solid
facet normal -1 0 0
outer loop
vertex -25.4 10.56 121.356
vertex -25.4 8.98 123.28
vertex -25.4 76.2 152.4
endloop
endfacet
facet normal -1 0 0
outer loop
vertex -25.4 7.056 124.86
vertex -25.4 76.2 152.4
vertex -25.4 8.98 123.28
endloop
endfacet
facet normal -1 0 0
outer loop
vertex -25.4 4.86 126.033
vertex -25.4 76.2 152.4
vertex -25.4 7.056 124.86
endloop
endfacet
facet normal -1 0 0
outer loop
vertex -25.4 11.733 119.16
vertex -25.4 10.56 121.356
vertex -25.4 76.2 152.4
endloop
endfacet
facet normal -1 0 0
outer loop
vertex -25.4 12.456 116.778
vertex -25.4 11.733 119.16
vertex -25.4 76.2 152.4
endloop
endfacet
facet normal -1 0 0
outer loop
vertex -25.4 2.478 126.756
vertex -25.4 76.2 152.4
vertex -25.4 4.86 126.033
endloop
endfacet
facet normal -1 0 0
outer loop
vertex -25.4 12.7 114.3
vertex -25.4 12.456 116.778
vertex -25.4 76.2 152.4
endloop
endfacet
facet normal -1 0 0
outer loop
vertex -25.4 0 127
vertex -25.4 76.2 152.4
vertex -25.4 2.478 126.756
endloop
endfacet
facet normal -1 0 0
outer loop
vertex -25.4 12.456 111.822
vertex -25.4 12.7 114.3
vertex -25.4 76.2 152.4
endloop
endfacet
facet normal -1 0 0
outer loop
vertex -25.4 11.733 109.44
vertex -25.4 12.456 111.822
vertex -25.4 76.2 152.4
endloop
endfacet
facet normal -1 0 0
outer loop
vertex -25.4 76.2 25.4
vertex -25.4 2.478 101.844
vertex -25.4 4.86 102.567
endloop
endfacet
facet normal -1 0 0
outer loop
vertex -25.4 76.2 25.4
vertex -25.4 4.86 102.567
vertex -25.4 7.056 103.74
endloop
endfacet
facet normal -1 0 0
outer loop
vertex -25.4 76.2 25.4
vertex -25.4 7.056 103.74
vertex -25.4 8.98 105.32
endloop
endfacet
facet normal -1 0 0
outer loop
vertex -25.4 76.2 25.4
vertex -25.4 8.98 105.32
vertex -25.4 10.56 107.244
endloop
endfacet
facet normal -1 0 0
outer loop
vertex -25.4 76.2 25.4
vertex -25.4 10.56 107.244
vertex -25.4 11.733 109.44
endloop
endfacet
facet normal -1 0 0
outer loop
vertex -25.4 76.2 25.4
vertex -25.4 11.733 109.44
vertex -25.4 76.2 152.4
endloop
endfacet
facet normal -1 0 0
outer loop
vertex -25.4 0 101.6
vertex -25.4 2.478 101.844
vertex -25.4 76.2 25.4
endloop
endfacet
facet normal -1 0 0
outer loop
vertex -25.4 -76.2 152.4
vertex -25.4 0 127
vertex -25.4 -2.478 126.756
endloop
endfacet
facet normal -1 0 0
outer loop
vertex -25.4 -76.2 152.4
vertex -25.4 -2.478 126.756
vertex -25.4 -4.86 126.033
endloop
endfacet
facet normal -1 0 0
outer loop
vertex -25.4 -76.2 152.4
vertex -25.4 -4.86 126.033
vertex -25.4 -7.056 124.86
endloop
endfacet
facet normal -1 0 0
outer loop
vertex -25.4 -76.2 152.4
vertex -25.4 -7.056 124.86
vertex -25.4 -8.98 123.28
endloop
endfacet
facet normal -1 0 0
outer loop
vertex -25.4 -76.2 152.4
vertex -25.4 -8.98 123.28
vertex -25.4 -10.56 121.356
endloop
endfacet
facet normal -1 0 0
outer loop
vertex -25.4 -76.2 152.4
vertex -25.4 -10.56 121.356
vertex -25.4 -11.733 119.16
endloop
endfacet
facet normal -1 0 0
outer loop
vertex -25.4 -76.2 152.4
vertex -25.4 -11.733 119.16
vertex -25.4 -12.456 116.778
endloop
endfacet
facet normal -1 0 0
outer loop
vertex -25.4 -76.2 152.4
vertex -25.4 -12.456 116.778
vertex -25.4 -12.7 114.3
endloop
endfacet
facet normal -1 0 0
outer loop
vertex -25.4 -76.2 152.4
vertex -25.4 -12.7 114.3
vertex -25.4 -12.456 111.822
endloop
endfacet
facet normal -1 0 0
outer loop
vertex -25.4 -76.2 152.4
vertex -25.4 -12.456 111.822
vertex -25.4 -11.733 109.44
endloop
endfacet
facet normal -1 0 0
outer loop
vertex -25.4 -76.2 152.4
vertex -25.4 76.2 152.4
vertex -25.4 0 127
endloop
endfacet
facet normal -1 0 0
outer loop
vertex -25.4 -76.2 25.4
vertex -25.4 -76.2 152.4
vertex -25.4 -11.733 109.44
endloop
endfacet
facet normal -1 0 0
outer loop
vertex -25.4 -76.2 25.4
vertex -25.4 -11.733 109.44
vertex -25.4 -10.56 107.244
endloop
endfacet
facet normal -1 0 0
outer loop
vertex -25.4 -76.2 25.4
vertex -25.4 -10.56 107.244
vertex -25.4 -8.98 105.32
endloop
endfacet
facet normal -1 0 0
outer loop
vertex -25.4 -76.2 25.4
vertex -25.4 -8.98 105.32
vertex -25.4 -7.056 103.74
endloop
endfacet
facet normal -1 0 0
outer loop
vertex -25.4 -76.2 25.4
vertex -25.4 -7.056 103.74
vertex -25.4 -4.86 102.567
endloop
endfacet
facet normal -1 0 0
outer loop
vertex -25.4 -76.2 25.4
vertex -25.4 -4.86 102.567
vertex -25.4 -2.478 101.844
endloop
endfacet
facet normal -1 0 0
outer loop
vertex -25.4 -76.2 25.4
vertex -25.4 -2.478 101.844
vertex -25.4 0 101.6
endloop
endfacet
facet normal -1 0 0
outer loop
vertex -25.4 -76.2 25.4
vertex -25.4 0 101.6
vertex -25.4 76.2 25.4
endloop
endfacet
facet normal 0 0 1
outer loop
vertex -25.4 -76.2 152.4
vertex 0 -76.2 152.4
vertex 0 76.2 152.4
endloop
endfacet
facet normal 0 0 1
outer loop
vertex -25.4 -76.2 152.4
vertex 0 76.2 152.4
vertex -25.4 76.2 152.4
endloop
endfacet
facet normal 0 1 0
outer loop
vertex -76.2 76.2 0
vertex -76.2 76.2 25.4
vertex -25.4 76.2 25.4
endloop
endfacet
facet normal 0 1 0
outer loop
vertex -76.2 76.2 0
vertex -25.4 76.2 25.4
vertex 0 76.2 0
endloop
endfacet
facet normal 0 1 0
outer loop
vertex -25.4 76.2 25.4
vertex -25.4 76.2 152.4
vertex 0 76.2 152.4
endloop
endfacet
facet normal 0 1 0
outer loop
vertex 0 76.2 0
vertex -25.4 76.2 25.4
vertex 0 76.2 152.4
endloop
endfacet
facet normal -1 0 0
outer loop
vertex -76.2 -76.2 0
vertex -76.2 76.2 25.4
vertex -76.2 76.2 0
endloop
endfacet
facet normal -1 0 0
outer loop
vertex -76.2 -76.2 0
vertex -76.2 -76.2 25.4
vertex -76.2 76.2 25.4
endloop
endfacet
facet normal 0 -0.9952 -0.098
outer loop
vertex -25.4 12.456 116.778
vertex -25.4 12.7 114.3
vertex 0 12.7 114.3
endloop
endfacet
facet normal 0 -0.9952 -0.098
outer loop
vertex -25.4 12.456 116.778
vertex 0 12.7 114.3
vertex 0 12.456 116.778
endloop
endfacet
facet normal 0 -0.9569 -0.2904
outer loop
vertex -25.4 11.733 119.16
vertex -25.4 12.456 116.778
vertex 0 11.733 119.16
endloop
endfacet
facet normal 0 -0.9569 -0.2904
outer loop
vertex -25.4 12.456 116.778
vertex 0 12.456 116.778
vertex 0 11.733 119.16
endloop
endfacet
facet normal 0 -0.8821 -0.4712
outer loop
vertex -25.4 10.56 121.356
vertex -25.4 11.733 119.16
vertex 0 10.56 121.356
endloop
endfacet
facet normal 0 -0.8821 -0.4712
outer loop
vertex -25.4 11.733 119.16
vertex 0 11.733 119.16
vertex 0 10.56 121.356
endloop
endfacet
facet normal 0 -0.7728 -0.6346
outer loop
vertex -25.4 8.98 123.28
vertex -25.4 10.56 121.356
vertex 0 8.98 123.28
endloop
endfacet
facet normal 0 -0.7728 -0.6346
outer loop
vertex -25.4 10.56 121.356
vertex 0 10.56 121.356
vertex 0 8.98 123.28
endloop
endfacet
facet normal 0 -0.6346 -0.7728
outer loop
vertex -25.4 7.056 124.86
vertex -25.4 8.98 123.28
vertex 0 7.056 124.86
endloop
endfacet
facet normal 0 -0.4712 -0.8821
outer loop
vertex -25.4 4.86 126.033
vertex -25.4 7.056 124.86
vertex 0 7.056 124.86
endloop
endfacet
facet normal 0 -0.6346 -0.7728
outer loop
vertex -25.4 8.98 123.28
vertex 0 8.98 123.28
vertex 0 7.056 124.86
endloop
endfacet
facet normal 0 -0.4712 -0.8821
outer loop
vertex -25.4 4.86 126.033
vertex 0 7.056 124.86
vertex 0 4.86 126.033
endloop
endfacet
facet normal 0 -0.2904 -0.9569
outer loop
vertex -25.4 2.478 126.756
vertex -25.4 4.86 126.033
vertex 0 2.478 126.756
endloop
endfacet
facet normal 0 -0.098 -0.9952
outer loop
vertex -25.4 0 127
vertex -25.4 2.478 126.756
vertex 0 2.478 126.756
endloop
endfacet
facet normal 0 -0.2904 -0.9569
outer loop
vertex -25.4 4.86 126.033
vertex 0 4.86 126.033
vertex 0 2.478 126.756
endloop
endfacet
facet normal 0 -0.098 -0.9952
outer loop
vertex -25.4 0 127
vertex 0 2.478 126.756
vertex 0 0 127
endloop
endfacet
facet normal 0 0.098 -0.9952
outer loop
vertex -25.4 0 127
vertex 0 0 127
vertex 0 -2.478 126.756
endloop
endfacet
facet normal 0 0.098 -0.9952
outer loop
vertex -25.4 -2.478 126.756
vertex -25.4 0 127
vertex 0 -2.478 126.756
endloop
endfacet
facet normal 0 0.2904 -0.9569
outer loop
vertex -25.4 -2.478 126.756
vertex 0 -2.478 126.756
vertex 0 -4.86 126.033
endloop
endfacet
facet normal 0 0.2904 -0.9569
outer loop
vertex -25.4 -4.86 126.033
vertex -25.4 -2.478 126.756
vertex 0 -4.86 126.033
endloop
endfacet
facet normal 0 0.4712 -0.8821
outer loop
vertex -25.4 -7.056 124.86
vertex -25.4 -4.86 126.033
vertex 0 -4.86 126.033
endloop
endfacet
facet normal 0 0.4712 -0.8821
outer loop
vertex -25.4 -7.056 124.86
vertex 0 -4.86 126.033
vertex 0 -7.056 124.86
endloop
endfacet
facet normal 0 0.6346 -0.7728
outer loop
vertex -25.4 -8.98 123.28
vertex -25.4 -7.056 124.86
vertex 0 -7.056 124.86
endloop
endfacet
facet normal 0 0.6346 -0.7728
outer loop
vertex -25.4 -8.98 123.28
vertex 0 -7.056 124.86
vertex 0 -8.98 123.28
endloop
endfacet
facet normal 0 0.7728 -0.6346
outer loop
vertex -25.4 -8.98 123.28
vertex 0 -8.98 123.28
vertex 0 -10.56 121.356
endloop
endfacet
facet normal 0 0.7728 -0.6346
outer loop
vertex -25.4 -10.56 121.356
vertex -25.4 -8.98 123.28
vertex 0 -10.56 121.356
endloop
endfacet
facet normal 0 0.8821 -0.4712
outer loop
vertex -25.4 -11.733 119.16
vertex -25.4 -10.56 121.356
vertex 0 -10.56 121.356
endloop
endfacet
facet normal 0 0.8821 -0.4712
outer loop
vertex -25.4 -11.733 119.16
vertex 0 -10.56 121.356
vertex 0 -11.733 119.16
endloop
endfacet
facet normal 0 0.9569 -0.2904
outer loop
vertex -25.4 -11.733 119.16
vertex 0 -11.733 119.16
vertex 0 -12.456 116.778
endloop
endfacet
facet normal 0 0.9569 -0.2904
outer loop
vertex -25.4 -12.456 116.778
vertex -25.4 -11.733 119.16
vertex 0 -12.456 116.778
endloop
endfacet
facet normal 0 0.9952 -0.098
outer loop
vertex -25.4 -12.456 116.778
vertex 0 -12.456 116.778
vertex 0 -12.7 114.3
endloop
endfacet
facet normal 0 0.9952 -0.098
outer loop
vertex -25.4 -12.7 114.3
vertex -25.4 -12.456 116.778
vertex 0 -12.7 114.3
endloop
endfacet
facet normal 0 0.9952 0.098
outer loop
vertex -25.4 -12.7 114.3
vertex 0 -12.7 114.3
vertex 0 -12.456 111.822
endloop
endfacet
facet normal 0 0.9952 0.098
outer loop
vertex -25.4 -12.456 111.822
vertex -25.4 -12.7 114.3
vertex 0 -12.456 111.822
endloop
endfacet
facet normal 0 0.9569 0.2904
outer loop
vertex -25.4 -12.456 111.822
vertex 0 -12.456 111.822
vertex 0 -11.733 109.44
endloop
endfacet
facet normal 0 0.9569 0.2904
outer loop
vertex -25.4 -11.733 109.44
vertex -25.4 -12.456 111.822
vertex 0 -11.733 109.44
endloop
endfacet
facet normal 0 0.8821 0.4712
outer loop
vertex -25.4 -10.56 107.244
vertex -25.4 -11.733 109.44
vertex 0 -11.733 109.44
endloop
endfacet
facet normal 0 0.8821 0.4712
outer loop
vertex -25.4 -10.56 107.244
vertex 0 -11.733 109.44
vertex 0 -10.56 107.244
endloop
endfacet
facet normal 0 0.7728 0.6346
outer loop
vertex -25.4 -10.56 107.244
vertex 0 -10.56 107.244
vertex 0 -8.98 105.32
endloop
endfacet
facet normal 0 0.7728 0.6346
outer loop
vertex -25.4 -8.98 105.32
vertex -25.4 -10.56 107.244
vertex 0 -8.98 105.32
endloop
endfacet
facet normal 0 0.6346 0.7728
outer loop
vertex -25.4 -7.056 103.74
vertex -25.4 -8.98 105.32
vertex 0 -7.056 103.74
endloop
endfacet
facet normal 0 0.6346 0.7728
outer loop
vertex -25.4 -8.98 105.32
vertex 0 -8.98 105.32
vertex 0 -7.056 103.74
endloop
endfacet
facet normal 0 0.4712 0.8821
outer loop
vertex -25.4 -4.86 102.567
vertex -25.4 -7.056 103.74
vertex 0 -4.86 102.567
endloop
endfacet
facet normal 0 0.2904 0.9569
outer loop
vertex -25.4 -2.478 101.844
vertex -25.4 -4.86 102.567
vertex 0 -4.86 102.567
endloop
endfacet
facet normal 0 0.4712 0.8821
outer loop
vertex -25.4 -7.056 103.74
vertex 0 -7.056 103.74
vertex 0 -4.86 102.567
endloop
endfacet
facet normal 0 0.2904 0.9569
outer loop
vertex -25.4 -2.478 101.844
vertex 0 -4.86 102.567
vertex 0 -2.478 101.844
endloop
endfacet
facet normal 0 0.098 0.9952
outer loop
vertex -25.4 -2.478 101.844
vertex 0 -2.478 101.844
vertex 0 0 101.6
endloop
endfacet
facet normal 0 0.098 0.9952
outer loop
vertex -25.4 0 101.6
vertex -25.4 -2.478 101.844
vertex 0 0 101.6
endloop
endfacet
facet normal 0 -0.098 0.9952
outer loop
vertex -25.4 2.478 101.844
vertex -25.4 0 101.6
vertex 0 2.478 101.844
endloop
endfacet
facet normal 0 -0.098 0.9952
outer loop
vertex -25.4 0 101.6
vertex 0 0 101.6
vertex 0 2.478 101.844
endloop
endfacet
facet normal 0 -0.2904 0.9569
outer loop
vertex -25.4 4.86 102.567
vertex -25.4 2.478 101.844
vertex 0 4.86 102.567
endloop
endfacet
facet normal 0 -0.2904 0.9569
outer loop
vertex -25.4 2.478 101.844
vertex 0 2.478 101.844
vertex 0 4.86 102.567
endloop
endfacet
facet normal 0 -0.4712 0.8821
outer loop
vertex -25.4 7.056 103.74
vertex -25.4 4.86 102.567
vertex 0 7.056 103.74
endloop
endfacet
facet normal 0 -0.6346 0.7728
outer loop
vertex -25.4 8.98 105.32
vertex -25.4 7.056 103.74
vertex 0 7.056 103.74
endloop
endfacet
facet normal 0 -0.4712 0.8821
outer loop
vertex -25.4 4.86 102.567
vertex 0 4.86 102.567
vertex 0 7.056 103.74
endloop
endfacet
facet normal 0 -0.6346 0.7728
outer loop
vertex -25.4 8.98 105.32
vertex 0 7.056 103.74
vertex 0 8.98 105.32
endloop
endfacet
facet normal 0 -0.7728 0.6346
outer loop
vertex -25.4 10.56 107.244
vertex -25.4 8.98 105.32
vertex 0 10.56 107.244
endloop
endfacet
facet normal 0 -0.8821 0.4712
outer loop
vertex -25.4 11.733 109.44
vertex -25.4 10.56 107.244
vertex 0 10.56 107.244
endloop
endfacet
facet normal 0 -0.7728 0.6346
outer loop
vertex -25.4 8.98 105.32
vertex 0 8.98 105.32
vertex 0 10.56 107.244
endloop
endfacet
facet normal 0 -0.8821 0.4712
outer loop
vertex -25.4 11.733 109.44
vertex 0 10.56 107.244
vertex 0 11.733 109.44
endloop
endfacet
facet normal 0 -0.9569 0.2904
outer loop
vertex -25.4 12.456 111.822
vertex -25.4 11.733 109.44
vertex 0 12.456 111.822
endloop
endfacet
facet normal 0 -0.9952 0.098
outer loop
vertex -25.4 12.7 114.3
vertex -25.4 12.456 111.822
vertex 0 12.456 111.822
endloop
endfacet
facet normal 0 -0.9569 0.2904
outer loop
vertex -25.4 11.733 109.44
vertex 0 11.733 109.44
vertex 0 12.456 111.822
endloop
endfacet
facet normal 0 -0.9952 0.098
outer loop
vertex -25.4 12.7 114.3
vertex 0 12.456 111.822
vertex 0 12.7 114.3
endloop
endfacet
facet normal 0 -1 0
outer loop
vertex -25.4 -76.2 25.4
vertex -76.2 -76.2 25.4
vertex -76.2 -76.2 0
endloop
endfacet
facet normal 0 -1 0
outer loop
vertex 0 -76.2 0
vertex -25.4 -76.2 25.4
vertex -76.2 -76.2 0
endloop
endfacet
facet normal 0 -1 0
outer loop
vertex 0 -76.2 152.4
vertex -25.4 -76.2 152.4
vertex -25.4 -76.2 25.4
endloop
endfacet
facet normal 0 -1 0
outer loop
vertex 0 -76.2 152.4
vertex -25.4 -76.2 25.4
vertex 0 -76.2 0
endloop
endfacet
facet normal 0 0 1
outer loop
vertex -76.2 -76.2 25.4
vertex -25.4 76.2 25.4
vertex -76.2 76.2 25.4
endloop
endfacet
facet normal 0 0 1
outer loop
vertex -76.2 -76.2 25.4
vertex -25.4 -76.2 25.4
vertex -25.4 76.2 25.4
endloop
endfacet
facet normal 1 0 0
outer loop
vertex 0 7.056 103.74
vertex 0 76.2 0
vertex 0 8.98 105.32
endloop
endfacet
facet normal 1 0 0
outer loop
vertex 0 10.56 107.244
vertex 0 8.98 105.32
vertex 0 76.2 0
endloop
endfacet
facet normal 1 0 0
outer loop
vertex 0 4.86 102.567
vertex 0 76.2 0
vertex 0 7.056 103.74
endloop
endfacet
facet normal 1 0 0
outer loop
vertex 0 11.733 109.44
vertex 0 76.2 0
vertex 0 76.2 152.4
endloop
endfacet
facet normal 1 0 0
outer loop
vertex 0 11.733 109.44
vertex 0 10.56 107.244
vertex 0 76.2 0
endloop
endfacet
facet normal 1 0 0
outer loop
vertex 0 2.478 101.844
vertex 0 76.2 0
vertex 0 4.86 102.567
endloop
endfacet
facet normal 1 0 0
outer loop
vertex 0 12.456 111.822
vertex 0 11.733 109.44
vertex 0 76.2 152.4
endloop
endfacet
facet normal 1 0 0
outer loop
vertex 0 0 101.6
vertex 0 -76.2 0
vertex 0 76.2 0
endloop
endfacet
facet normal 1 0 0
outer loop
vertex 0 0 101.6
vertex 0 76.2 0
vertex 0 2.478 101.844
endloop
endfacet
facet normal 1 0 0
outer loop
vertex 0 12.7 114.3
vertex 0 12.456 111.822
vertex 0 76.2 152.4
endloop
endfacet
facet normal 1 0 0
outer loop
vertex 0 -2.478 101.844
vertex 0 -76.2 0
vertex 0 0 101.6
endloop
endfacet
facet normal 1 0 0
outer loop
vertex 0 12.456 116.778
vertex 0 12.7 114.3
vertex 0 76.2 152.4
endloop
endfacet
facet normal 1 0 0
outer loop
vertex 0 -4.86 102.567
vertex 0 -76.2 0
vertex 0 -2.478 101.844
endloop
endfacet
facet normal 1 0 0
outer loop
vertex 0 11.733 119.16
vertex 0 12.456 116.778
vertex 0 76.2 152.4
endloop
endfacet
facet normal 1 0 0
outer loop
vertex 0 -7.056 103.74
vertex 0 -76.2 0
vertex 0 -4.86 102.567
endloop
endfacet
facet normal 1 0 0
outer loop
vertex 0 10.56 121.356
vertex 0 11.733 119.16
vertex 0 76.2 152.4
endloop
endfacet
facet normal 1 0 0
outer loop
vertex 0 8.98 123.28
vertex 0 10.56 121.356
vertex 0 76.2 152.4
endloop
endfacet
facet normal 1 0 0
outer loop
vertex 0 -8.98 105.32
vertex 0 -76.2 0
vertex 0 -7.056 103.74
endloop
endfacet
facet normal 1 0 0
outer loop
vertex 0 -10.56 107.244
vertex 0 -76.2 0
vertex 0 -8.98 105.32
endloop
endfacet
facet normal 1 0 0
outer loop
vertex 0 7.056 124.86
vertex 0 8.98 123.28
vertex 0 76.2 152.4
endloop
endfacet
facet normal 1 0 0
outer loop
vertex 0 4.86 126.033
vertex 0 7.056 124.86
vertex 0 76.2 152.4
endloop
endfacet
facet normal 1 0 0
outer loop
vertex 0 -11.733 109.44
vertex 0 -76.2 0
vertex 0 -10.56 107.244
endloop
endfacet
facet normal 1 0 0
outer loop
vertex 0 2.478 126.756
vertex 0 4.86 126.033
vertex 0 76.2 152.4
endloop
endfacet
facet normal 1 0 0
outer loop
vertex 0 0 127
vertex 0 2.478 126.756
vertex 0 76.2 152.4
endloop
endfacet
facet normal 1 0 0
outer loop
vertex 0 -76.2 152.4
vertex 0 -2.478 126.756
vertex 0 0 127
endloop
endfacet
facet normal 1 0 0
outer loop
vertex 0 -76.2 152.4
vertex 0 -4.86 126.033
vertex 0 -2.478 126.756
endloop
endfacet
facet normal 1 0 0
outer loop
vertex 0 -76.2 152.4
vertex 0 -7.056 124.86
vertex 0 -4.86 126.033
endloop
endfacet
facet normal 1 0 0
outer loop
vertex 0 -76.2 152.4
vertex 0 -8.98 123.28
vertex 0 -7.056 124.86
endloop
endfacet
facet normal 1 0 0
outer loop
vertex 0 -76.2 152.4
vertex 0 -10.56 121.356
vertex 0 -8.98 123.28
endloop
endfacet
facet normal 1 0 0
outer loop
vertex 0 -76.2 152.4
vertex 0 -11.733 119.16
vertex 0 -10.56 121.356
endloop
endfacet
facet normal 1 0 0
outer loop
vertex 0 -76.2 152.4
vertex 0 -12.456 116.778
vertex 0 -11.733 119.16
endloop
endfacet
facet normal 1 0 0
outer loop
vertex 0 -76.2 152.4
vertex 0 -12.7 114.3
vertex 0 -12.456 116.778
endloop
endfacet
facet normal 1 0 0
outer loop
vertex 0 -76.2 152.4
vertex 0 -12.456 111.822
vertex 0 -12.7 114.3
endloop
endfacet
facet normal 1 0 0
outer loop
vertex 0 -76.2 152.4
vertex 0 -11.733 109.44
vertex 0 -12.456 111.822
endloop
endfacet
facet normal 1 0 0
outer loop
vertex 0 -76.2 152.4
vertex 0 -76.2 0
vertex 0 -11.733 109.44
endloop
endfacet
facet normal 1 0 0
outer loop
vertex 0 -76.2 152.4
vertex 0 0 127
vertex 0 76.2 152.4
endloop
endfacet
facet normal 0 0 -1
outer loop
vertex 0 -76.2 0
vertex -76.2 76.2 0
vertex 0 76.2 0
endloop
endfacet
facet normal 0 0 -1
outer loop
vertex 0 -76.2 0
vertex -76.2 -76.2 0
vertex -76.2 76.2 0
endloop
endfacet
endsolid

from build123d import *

# Parameters (mm, degrees)
F1_DEPTH = 76.2
F2_R     = 12.7
F3_DEPTH = 76.201


with BuildPart() as f1:
    # F0 (on Front) → F1 (new body, symmetric)
    with BuildSketch(Plane.XZ):
        Polygon((-76.2, 0), (0, 0), (0, 152.4), (-25.4, 152.4), (-25.4, 25.4), (-76.2, 25.4), align=None)
    extrude(amount=F1_DEPTH, both=True)

    # F2 (on face) → F3 (cut, through all)
    with BuildSketch(Plane.YZ):
        with Locations((0, 114.3)):
            Circle(F2_R)
    extrude(amount=-F3_DEPTH, mode=Mode.SUBTRACT)


solid = f1.part
